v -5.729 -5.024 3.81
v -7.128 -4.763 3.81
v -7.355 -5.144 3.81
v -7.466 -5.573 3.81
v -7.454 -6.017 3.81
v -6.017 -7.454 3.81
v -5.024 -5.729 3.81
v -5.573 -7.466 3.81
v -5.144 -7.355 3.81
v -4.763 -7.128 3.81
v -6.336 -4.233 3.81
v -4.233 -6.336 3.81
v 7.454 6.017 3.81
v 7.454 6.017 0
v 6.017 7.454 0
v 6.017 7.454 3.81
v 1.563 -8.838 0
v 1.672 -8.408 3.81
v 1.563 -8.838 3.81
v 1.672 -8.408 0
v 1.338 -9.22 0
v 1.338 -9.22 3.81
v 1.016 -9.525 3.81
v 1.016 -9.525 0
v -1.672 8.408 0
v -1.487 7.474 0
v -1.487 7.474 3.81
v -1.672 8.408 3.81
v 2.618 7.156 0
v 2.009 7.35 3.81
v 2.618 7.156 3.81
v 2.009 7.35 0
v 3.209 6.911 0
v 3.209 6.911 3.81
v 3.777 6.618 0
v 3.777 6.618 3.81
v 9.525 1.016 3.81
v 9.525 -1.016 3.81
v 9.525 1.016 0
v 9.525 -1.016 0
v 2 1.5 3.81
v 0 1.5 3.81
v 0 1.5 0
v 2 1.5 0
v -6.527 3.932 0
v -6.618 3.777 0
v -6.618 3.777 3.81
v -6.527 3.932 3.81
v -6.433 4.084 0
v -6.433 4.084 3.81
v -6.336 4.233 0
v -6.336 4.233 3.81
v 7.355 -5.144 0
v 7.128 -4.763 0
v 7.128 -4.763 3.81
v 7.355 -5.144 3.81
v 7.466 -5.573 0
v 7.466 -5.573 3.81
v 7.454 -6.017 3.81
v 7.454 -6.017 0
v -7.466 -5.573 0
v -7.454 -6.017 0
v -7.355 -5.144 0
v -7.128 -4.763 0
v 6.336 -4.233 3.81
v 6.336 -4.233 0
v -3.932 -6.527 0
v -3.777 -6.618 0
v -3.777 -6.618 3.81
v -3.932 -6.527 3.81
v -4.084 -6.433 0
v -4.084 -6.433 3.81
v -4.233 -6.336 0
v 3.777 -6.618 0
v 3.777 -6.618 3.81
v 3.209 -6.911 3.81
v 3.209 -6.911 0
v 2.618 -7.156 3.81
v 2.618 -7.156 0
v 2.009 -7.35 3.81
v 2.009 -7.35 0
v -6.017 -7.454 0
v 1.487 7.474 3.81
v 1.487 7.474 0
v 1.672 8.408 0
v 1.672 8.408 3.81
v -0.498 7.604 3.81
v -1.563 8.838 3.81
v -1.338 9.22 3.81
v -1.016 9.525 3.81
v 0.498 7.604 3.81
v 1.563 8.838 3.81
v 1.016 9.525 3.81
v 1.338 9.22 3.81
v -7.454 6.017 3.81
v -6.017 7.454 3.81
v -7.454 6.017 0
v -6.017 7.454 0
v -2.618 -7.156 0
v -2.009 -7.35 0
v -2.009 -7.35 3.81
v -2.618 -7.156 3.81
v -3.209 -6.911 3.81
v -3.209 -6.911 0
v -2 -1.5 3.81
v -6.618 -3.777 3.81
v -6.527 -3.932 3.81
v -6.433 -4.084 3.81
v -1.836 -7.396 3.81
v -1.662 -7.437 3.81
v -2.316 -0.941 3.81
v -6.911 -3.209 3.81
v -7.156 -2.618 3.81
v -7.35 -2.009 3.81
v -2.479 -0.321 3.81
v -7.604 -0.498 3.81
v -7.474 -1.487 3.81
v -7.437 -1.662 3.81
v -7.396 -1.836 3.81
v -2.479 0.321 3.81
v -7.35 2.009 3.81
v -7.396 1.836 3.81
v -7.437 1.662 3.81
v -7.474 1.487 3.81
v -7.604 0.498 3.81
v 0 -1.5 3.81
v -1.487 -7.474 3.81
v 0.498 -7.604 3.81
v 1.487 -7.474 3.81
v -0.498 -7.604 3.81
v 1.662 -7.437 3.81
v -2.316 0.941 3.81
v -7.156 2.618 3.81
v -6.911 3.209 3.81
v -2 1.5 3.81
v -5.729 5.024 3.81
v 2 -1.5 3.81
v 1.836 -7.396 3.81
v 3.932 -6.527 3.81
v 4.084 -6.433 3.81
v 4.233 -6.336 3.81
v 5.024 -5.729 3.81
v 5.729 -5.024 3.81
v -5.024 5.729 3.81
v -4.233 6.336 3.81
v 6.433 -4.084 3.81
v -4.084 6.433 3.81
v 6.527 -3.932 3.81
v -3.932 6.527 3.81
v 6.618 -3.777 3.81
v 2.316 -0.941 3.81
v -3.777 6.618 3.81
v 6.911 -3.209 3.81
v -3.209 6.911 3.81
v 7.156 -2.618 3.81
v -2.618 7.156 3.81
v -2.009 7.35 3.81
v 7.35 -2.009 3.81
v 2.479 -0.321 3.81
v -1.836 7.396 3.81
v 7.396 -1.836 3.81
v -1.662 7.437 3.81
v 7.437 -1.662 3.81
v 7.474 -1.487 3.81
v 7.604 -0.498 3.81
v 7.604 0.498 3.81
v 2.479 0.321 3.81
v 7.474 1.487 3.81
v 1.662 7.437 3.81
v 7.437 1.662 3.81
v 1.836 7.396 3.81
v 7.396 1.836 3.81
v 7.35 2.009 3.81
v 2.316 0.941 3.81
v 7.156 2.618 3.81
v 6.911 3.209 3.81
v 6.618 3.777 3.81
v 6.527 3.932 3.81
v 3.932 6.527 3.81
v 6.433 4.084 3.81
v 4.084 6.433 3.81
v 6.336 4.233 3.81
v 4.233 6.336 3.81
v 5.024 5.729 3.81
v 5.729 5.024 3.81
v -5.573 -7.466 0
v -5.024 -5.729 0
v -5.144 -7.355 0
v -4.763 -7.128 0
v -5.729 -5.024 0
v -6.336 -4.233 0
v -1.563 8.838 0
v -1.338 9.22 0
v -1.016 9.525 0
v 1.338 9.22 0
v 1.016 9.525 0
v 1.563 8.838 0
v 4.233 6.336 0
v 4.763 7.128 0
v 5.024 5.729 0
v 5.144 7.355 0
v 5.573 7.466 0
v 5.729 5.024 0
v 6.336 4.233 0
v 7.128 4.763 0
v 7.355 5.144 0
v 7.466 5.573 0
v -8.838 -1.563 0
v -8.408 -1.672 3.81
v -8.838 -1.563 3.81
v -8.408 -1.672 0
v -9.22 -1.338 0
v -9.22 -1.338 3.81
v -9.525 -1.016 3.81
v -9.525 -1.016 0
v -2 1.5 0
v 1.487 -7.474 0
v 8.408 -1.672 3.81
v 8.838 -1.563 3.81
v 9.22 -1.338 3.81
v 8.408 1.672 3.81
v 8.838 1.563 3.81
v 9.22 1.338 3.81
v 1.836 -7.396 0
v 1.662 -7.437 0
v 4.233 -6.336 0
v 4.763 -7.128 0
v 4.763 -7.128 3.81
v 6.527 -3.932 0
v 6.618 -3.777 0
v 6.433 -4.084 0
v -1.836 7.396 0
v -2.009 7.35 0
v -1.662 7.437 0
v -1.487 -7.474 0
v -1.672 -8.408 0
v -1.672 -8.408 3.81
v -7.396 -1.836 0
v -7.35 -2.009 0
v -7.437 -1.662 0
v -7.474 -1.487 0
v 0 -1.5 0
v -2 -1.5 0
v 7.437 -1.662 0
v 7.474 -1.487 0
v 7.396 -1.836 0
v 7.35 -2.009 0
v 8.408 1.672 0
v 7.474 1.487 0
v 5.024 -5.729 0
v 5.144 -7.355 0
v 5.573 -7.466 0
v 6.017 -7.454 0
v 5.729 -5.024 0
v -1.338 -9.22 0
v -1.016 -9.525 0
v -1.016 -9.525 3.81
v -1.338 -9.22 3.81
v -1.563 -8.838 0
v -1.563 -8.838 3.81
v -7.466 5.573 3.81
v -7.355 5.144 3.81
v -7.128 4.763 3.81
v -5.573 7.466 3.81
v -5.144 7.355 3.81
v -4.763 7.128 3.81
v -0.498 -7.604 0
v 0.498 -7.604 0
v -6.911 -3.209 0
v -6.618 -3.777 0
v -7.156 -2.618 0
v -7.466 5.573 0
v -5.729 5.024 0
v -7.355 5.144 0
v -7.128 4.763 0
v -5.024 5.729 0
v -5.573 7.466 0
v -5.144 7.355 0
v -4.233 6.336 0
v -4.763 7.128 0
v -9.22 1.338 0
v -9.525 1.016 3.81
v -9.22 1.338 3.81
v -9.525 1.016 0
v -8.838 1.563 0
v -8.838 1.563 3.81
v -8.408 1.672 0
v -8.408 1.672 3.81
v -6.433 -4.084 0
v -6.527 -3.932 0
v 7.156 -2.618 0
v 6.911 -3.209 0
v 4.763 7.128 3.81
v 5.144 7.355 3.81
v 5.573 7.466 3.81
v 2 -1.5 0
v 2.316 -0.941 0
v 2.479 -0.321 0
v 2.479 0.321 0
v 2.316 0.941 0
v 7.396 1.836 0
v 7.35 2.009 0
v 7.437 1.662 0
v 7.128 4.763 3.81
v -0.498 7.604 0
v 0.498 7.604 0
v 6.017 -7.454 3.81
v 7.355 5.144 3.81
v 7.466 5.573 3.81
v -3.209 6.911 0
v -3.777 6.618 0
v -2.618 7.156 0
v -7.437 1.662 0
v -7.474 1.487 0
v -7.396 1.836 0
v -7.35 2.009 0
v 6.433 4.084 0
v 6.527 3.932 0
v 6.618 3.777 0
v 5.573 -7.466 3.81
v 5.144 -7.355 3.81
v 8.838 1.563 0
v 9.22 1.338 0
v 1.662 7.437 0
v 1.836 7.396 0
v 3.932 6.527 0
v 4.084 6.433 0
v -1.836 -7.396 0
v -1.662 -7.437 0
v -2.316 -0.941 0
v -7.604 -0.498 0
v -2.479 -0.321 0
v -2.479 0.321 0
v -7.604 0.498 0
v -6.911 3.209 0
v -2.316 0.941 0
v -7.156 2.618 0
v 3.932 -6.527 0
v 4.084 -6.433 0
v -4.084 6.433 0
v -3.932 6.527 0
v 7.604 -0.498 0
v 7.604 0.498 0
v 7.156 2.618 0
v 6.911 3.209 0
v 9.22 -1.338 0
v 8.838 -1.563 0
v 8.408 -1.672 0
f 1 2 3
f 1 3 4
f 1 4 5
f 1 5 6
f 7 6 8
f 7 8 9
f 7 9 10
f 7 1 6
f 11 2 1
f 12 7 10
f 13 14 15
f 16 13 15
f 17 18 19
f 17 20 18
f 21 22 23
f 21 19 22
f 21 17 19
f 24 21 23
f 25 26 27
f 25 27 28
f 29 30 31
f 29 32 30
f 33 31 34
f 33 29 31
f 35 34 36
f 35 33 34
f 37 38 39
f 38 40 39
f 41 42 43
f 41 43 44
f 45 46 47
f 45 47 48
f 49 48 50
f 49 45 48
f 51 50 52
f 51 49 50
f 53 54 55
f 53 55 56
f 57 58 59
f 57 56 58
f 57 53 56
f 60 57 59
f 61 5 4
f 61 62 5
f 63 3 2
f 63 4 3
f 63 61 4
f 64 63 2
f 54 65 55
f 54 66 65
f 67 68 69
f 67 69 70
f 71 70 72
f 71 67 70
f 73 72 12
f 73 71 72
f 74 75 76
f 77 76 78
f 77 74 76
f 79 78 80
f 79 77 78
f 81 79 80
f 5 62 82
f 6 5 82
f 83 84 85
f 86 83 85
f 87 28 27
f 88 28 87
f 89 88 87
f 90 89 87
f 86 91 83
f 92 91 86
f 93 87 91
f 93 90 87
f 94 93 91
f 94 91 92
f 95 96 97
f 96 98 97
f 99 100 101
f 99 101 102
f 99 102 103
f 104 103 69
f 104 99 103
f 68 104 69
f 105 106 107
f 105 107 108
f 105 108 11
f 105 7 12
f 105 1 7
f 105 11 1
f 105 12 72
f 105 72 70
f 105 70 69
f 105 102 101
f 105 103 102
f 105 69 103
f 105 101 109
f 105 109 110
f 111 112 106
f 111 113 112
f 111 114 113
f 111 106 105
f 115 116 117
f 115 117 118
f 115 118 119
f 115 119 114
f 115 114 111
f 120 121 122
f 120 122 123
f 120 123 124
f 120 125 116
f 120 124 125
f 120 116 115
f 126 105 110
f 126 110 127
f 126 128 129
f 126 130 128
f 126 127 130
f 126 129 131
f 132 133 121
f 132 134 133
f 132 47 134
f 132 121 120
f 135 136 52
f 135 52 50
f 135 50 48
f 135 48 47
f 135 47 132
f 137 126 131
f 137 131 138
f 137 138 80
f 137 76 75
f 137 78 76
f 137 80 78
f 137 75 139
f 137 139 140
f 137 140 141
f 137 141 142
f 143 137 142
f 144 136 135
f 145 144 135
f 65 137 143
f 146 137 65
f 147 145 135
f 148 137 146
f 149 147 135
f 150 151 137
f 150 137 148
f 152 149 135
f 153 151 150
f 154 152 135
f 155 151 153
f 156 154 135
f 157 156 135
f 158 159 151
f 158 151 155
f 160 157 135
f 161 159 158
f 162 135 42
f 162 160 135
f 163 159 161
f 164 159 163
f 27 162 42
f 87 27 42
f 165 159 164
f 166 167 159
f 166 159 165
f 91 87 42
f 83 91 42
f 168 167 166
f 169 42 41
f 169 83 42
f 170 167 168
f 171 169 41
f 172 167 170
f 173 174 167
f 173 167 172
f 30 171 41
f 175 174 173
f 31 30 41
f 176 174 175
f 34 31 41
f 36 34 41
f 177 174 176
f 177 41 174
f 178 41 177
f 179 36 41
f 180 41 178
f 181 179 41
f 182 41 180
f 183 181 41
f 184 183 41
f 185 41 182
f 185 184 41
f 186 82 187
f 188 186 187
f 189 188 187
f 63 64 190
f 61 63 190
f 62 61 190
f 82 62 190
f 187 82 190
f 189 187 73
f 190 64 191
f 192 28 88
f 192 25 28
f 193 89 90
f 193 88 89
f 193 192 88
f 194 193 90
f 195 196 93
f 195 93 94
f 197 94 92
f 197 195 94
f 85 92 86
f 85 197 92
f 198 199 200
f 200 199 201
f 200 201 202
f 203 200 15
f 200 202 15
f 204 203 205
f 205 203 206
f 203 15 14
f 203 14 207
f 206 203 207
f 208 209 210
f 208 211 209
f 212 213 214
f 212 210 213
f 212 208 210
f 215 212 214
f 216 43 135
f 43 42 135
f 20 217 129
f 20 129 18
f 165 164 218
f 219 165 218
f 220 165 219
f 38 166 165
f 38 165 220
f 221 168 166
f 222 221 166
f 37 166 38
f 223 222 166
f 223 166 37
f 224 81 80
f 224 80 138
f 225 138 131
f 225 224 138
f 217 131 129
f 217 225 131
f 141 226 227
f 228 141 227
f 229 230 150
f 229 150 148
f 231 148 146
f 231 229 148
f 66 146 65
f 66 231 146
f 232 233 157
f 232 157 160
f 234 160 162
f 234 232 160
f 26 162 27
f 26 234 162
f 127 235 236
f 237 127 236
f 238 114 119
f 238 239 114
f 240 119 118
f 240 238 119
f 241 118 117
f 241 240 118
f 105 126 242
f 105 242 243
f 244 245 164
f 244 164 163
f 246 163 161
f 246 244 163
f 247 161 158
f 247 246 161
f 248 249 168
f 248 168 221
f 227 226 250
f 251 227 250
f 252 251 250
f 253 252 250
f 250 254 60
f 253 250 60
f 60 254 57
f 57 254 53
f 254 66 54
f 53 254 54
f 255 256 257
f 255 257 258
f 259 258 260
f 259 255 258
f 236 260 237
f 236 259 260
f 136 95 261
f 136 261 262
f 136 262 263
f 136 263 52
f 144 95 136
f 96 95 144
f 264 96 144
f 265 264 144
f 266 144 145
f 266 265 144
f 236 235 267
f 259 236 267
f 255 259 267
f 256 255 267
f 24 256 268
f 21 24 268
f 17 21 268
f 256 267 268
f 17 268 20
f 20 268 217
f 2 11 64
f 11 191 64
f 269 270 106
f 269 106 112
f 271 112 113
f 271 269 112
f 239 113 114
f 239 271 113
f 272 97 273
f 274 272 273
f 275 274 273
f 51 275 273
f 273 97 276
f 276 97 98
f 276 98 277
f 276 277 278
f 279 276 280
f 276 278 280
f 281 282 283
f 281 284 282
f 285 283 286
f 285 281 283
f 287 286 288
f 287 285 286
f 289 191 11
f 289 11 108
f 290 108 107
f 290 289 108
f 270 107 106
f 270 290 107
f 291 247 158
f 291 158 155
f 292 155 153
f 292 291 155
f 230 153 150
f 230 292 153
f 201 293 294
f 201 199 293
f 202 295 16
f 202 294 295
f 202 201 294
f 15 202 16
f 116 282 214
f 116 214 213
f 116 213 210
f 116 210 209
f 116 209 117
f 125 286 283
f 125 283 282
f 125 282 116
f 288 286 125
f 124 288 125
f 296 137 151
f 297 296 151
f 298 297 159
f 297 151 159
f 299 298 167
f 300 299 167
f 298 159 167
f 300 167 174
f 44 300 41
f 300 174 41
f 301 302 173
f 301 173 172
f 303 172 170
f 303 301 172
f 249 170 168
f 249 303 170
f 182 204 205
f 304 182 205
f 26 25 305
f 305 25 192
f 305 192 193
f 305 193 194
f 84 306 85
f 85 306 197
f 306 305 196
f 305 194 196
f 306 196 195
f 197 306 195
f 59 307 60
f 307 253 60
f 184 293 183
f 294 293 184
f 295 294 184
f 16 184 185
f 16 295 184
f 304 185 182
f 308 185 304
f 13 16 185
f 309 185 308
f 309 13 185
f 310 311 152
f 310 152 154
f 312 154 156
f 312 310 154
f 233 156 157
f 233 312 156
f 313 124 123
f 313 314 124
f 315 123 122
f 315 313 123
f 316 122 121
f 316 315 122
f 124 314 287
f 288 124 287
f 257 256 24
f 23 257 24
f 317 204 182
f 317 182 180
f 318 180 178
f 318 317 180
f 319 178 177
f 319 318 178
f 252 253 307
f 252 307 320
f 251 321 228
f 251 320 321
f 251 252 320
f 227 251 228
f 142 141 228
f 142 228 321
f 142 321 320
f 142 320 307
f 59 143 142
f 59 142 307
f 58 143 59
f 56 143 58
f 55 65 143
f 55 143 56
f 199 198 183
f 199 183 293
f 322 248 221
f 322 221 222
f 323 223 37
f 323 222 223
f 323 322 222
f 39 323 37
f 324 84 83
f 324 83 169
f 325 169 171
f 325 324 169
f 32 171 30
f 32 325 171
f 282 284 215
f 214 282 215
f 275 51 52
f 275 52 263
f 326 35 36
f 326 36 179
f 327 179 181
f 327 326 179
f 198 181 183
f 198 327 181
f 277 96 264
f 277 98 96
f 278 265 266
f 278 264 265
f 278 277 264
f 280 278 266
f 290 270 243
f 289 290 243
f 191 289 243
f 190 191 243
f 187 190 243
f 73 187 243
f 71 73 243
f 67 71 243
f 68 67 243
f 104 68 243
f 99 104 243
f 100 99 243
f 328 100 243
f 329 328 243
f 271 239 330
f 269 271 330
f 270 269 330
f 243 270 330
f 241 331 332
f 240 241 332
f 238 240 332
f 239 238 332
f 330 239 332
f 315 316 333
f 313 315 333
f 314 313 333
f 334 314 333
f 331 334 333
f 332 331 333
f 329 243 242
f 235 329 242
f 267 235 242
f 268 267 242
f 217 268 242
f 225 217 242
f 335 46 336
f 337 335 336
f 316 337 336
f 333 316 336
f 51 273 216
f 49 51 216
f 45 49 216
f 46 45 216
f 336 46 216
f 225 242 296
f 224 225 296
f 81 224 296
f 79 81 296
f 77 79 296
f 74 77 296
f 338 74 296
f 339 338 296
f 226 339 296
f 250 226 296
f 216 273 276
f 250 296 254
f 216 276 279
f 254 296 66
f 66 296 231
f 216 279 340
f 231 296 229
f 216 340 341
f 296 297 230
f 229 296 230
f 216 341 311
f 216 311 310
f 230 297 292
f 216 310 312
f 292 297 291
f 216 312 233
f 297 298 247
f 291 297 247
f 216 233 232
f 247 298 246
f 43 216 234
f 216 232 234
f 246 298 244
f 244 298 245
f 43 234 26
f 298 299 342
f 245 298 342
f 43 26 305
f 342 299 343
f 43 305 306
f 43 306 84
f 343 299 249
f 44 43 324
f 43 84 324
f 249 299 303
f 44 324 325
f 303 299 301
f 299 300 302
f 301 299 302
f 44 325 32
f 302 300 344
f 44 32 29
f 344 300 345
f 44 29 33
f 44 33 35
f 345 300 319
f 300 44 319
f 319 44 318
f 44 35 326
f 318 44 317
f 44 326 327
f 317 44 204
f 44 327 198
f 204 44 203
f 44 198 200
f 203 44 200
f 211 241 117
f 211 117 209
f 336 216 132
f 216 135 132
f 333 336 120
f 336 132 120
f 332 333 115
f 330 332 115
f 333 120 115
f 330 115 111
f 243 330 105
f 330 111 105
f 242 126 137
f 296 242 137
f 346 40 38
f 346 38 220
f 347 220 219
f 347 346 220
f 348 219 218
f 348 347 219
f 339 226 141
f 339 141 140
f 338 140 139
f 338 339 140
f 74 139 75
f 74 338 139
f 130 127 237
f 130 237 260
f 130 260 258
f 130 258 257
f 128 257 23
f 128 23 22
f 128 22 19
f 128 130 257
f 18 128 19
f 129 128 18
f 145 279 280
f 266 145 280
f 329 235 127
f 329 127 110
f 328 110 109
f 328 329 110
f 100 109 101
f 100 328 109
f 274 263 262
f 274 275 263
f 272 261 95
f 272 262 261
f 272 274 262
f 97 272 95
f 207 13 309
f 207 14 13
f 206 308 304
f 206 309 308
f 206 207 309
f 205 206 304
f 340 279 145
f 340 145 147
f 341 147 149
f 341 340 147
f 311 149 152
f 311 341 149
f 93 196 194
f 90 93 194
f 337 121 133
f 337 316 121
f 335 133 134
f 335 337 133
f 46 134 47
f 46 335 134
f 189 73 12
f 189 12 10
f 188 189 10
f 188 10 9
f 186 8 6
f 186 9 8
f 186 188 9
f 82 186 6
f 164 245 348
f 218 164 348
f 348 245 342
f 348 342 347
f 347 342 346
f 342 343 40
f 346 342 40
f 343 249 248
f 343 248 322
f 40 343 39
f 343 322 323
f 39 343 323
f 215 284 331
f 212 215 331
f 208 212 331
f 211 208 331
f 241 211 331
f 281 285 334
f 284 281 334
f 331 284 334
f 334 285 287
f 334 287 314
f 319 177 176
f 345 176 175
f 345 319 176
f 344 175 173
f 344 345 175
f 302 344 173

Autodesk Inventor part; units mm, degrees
ref_plane "YZ Plane" through (0, 0, 0) normal (1, 0, 0) x (0, 1, 0)
ref_plane "XZ Plane" through (0, 0, 0) normal (0, 1, 0) x (-1, 0, 0)
ref_plane "XY Plane" through (0, 0, 0) normal (0, 0, 1) x (1, 0, 0)
sketch "Sketch1" plane through (0, 0, 0) normal (0, 0, 1) x (1, 0, 0)
  arc A0 (-2.0086, 7.3505) -> (2.0086, 7.3505) centre (0, 0) ccw
  line L0 (0, 7.62) -> (0, 9.525)
  line L1 (0, 9.525) -> (1.016, 9.525)
  line L2 (0, 9.525) -> (-1.016, 9.525)
  arc A1 (-1.4866, 7.4736) -> (1.4866, 7.4736) centre (0, 0) ccw
  line L3 (-1.4866, 7.4736) -> (-1.8582, 9.342)
  line L4 (-2.916, 7.04) -> (-3.6451, 8.8)
  line L5 (-4.2334, 6.3358) -> (-5.2918, 7.9197)
  line L6 (-5.3882, 5.3882) -> (-6.7352, 6.7352)
  line L7 (-6.3358, 4.2334) -> (-7.9197, 5.2918)
  line L8 (-7.04, 2.916) -> (-8.8, 3.6451)
  line L9 (-7.04, -2.916) -> (-8.8, -3.6451)
  line L10 (-6.3358, -4.2334) -> (-7.9197, -5.2918)
  line L11 (-5.3882, -5.3882) -> (-6.7352, -6.7352)
  line L12 (-4.2334, -6.3358) -> (-5.2918, -7.9197)
  line L13 (-2.916, -7.04) -> (-3.6451, -8.8)
  line L14 (-1.4866, -7.4736) -> (-1.8582, -9.342)
  line L15 (0, -7.62) -> (0, -9.525)
  line L16 (1.4866, -7.4736) -> (1.8582, -9.342)
  line L17 (2.916, -7.04) -> (3.6451, -8.8)
  line L18 (4.2334, -6.3358) -> (5.2918, -7.9197)
  line L19 (5.3882, -5.3882) -> (6.7352, -6.7352)
  line L20 (6.3358, -4.2334) -> (7.9197, -5.2918)
  line L21 (7.04, -2.916) -> (8.8, -3.6451)
  line L22 (7.4736, -1.4866) -> (9.342, -1.8582)
  line L23 (7.62, 0) -> (9.525, 0)
  line L24 (7.4736, 1.4866) -> (9.342, 1.8582)
  line L25 (7.04, 2.916) -> (8.8, 3.6451)
  line L26 (6.3358, 4.2334) -> (7.9197, 5.2918)
  line L27 (5.3882, 5.3882) -> (6.7352, 6.7352)
  line L28 (4.2334, 6.3358) -> (5.2918, 7.9197)
  line L29 (2.916, 7.04) -> (3.6451, 8.8)
  line L30 (1.4866, 7.4736) -> (1.8582, 9.342)
  arc A2 (-1.4866, 7.4736) -> (1.4866, 7.4736) centre (0, 0) ccw
  arc A3 (-1.016, 9.525) -> (-1.6724, 8.4079) centre (-0.1056, 8.2386) ccw
  arc A4 (1.6724, 8.4079) -> (1.016, 9.525) centre (0.1056, 8.2386) ccw
  circle A5 centre (0, 0) radius 7.62
  line L31 (-1.4866, 7.4736) -> (-1.6724, 8.4079)
  line L32 (-1.016, 9.525) -> (1.016, 9.525)
  line L33 (1.6724, 8.4079) -> (1.4866, 7.4736)
  arc A6 (-1.016, 9.525) -> (-1.6724, 8.4079) centre (-0.1056, 8.2386) ccw
  arc A7 (1.6724, 8.4079) -> (1.016, 9.525) centre (0.1056, 8.2386) ccw
  point P0 (-7.4736, 1.4866)
  point P1 (-7.62, 0)
  point P2 (-7.4736, -1.4866)
  dimension "d0" = 15.24
  dimension "d1" = 360
  dimension "d2" = 1.016
  dimension "d3" = 1.016
  dimension "d4" = 1.905
extrude "Extrusion1" add sketch "Sketch1" along normal blind 3.81
pattern_circular "Circular Pattern1" count 8 over 360 about axis through (0, 0, 0) along (0, 0, 1) of "Extrusion1"
sketch "Sketch3" plane through (0, 0, 3.81) normal (0, 0, 1) x (1, 0, 0)
  line L0 (0, 0) -> (0, 1.5)
  line L1 (0, 1.5) -> (2, 1.5)
  line L2 (0, 1.5) -> (-2, 1.5)
  line L3 (0, 0) -> (0.1755, 0)
  line L4 (0, -1.5) -> (2, -1.5)
  line L5 (0, -1.5) -> (-2, -1.5)
  arc A0 (-2, 1.5) -> (-2, -1.5) centre (0, 0) ccw
  arc A1 (2, -1.5) -> (2, 1.5) centre (0, 0) ccw
  dimension "d14" = 1.5
extrude "Extrusion3" cut sketch "Sketch3" against normal up to next
sketch "Sketch4" plane through (0, 0, 3.81) normal (0, 0, 1) x (1, 0, 0)
  circle A0 centre (0, 0) radius 2.5
sketch "Sketch5" plane through (0, 0, 3.81) normal (0, 0, 1) x (1, 0, 0)
  arc A0 (-2, 1.5) -> (-2, -1.5) centre (0, 0) ccw projected
  line L0 (-2, 1.5) -> (2, 1.5) projected
  arc A1 (2, -1.5) -> (2, 1.5) centre (0, 0) ccw projected
  line L1 (2, -1.5) -> (-2, -1.5) projected
  line L2 (1.4866, 7.4736) -> (1.6724, 8.4079) projected
  arc A2 (1.6724, 8.4079) -> (1.016, 9.525) centre (0.1056, 8.2386) ccw projected
  line L3 (1.016, 9.525) -> (-1.016, 9.525) projected
  arc A3 (-1.016, 9.525) -> (-1.6724, 8.4079) centre (-0.1056, 8.2386) ccw projected
  line L4 (-1.6724, 8.4079) -> (-1.4866, 7.4736) projected
  arc A4 (-1.4866, 7.4736) -> (-4.2334, 6.3358) centre (0, 0) ccw projected
  line L5 (-4.2334, 6.3358) -> (-4.7627, 7.1279) projected
  arc A5 (-4.7627, 7.1279) -> (-6.0168, 7.4536) centre (-5.7509, 5.9002) ccw projected
  line L6 (-6.0168, 7.4536) -> (-7.4536, 6.0168) projected
  arc A6 (-7.4536, 6.0168) -> (-7.1279, 4.7627) centre (-5.9002, 5.7509) ccw projected
  line L7 (-7.1279, 4.7627) -> (-6.3358, 4.2334) projected
  arc A7 (-6.3358, 4.2334) -> (-7.4736, 1.4866) centre (0, 0) ccw projected
  line L8 (-7.4736, 1.4866) -> (-8.4079, 1.6724) projected
  arc A8 (-8.4079, 1.6724) -> (-9.525, 1.016) centre (-8.2386, 0.1056) ccw projected
  line L9 (-9.525, 1.016) -> (-9.525, -1.016) projected
  arc A9 (-9.525, -1.016) -> (-8.4079, -1.6724) centre (-8.2386, -0.1056) ccw projected
  line L10 (-8.4079, -1.6724) -> (-7.4736, -1.4866) projected
  arc A10 (-7.4736, -1.4866) -> (-6.3358, -4.2334) centre (0, 0) ccw projected
  line L11 (-6.3358, -4.2334) -> (-7.1279, -4.7627) projected
  arc A11 (-7.1279, -4.7627) -> (-7.4536, -6.0168) centre (-5.9002, -5.7509) ccw projected
  line L12 (-7.4536, -6.0168) -> (-6.0168, -7.4536) projected
  arc A12 (-6.0168, -7.4536) -> (-4.7627, -7.1279) centre (-5.7509, -5.9002) ccw projected
  line L13 (-4.7627, -7.1279) -> (-4.2334, -6.3358) projected
  arc A13 (-4.2334, -6.3358) -> (-1.4866, -7.4736) centre (0, 0) ccw projected
  line L14 (-1.4866, -7.4736) -> (-1.6724, -8.4079) projected
  arc A14 (-1.6724, -8.4079) -> (-1.016, -9.525) centre (-0.1056, -8.2386) ccw projected
  line L15 (-1.016, -9.525) -> (1.016, -9.525) projected
  arc A15 (1.016, -9.525) -> (1.6724, -8.4079) centre (0.1056, -8.2386) ccw projected
  line L16 (1.6724, -8.4079) -> (1.4866, -7.4736) projected
  arc A16 (1.4866, -7.4736) -> (4.2334, -6.3358) centre (0, 0) ccw projected
  line L17 (4.2334, -6.3358) -> (4.7627, -7.1279) projected
  arc A17 (4.7627, -7.1279) -> (6.0168, -7.4536) centre (5.7509, -5.9002) ccw projected
  line L18 (6.0168, -7.4536) -> (7.4536, -6.0168) projected
  arc A18 (7.4536, -6.0168) -> (7.1279, -4.7627) centre (5.9002, -5.7509) ccw projected
  line L19 (7.1279, -4.7627) -> (6.3358, -4.2334) projected
  arc A19 (6.3358, -4.2334) -> (7.4736, -1.4866) centre (0, 0) ccw projected
  line L20 (7.4736, -1.4866) -> (8.4079, -1.6724) projected
  arc A20 (8.4079, -1.6724) -> (9.525, -1.016) centre (8.2386, -0.1056) ccw projected
  line L21 (9.525, -1.016) -> (9.525, 1.016) projected
  arc A21 (9.525, 1.016) -> (8.4079, 1.6724) centre (8.2386, 0.1056) ccw projected
  line L22 (8.4079, 1.6724) -> (7.4736, 1.4866) projected
  arc A22 (7.4736, 1.4866) -> (6.3358, 4.2334) centre (0, 0) ccw projected
  line L23 (6.3358, 4.2334) -> (7.1279, 4.7627) projected
  arc A23 (7.1279, 4.7627) -> (7.4536, 6.0168) centre (5.9002, 5.7509) ccw projected
  line L24 (7.4536, 6.0168) -> (6.0168, 7.4536) projected
  arc A24 (6.0168, 7.4536) -> (4.7627, 7.1279) centre (5.7509, 5.9002) ccw projected
  line L25 (4.7627, 7.1279) -> (4.2334, 6.3358) projected
  arc A25 (4.2334, 6.3358) -> (1.4866, 7.4736) centre (0, 0) ccw projected
properties part number "8 ul Driver Gear"
